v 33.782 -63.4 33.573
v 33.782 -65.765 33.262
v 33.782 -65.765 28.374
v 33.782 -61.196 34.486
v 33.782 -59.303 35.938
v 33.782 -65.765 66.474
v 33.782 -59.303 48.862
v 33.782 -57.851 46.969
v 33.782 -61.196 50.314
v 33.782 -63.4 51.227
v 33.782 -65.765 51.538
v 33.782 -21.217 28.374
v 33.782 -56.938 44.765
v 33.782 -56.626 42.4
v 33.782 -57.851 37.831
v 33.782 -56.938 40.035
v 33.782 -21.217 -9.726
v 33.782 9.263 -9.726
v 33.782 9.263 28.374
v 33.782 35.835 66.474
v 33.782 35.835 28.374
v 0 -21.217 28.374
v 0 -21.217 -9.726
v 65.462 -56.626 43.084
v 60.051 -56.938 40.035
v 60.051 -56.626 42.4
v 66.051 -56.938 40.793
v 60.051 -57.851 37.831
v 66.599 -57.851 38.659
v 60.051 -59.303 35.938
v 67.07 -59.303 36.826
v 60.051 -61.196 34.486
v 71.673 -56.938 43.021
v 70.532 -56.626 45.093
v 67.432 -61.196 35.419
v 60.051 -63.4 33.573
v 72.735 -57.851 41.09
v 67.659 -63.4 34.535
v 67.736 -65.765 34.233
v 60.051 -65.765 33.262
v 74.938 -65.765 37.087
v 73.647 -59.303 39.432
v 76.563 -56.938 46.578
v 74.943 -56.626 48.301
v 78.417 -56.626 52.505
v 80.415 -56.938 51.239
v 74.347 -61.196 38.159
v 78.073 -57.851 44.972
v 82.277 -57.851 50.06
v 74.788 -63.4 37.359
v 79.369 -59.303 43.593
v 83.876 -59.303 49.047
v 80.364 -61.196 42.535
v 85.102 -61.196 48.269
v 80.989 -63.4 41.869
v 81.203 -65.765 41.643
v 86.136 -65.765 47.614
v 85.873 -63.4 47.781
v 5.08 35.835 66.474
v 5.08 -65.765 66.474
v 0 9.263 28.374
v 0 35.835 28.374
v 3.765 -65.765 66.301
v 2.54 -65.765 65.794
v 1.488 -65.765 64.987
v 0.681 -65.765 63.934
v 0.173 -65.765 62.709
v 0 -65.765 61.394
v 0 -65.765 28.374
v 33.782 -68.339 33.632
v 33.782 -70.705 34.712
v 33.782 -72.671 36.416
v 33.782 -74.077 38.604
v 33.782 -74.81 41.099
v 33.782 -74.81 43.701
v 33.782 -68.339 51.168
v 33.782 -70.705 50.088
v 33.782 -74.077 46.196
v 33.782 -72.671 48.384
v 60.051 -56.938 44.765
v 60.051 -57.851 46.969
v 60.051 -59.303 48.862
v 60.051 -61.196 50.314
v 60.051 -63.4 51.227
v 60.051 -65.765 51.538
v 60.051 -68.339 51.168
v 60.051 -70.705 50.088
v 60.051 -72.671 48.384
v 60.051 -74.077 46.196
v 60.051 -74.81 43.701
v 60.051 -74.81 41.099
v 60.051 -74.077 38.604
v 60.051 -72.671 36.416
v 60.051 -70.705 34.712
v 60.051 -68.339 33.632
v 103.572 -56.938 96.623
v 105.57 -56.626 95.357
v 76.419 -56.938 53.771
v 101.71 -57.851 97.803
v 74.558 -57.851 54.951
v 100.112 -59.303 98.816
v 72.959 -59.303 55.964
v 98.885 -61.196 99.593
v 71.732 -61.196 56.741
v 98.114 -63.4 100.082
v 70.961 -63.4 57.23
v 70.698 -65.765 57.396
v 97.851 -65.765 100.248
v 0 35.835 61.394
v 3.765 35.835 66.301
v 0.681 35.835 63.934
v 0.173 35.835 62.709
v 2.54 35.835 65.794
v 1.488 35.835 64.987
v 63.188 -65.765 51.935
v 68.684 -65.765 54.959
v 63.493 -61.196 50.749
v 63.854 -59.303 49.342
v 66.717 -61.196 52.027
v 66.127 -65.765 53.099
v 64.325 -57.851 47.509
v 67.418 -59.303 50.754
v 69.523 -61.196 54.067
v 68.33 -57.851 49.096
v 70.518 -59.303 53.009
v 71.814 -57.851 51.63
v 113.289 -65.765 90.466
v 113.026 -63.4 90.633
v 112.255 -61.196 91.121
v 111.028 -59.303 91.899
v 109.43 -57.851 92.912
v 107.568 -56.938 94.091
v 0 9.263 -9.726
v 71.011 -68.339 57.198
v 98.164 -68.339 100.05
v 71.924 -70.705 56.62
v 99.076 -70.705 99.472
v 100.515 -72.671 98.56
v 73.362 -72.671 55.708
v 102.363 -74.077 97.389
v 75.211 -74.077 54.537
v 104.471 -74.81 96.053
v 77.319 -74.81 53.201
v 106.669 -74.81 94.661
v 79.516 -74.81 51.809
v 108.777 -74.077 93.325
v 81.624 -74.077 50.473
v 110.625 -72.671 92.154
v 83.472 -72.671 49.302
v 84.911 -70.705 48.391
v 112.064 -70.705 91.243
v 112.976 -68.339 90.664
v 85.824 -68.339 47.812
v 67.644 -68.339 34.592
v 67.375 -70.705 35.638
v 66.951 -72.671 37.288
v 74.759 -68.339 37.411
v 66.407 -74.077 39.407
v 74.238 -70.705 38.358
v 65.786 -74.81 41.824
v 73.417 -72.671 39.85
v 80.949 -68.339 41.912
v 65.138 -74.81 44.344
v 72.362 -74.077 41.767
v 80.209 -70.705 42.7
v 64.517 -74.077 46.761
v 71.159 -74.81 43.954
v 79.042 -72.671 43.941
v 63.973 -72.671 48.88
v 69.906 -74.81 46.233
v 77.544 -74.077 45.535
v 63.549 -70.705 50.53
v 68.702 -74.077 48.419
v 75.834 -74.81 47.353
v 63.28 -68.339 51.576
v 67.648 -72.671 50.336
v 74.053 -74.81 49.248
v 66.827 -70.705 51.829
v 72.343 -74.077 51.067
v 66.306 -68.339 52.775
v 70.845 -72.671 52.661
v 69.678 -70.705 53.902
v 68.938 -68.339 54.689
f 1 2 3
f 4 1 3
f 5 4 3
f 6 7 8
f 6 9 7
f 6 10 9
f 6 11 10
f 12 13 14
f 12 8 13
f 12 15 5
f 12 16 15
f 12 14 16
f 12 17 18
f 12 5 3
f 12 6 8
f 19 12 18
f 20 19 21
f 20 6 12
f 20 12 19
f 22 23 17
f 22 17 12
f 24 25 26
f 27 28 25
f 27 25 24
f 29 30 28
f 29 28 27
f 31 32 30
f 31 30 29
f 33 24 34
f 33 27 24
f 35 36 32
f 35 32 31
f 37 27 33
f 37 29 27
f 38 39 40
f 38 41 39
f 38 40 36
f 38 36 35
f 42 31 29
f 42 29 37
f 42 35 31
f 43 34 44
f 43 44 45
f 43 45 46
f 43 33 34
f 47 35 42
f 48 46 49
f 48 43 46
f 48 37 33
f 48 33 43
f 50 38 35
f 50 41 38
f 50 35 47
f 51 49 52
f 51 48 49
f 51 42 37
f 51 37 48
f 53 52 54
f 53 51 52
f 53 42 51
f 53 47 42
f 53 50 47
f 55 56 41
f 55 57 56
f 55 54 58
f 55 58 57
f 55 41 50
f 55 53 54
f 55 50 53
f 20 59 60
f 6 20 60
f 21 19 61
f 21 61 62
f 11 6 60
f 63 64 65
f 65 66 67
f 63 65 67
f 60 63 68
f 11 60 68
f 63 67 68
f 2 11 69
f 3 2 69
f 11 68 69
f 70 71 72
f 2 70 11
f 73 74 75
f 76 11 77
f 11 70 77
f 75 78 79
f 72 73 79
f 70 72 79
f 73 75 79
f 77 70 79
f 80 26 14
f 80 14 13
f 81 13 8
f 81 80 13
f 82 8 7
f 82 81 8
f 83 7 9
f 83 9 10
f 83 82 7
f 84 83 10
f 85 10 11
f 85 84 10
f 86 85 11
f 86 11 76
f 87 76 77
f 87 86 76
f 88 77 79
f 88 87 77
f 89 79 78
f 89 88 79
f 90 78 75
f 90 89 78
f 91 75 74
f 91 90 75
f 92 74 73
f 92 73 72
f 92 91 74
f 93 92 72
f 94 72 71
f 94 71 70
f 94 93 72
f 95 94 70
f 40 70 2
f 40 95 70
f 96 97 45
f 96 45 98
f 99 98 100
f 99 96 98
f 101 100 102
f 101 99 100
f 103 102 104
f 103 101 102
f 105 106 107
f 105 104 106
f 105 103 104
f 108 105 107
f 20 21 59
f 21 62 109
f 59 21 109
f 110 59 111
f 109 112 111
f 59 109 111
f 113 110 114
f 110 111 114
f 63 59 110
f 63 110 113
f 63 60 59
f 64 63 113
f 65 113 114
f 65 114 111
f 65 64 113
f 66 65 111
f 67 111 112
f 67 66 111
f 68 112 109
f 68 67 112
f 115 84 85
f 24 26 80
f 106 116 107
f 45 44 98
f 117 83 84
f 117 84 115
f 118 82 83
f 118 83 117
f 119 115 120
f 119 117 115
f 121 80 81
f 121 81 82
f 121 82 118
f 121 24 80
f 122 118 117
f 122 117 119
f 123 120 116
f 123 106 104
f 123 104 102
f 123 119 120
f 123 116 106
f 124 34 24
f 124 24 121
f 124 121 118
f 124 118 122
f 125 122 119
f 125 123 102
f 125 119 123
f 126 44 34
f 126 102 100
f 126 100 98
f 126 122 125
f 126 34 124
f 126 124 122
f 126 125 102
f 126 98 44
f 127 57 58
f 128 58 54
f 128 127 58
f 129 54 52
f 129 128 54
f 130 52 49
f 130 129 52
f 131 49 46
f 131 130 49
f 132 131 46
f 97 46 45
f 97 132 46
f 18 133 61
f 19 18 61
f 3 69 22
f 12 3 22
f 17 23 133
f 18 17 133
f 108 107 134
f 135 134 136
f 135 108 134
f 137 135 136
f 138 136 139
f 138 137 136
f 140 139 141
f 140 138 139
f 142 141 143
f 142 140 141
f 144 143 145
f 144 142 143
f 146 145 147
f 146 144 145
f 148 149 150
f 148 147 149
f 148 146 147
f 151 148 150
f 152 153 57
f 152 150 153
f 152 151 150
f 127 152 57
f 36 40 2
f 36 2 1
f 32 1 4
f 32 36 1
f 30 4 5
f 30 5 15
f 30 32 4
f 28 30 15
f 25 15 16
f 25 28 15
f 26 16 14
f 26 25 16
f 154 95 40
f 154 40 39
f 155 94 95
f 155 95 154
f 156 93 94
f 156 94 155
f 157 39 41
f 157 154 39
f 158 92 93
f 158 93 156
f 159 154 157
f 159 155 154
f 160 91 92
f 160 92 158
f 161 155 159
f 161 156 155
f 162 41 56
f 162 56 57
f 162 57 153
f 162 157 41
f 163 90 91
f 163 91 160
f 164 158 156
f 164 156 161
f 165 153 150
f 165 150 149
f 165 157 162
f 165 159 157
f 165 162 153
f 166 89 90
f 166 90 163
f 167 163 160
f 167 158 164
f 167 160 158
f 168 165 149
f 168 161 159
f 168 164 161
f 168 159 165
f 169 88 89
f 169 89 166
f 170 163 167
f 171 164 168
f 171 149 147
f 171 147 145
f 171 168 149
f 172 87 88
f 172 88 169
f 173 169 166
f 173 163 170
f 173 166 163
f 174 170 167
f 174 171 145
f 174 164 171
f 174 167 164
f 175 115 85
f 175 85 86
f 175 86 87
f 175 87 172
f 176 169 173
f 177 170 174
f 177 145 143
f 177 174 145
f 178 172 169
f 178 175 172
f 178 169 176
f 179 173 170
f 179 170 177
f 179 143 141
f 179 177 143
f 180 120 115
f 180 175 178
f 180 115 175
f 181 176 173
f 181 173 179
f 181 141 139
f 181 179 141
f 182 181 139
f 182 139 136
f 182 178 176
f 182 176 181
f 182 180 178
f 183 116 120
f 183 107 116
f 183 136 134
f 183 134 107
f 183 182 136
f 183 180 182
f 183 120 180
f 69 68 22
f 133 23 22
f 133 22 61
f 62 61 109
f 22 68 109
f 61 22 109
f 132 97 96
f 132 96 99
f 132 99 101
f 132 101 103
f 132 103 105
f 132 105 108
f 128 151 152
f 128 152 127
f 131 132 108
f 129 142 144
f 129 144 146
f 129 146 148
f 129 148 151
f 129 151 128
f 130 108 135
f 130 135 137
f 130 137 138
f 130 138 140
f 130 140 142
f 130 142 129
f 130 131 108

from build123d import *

# Parameters (mm, degrees)
F0_W     = 30.4800020866
F0_H     = 16.8474918601
F0_H_2   = 38.1
F1_DEPTH = 33.782
F2_R     = 5.08


with BuildPart() as f1:
    # F0 (on Right) → F1 (new body)
    with BuildSketch(Plane.YZ):
        Polygon((35.8352853537, 66.4744316269), (-65.7647146463, 66.4744316269), (-65.7647146463, 28.3744316269), (-21.2170266578, 28.3744316269), (-21.2170266578, 45.221923487), (9.2629754288, 45.221923487), (9.2629754288, 28.3744316269), (35.8352853537, 28.3744316269), align=None)
        with Locations((-5.9770256145, 36.798177557)):
            Rectangle(F0_W, F0_H)
        with Locations((-5.9770256145, 9.3244316269)):
            Rectangle(F0_W, F0_H_2)
    extrude(amount=F1_DEPTH)

    # F2
    f2_edges = [f1.edges().sort_by_distance(p)[0] for p in [
        (0, -14.964715, 66.474432),
    ]]
    fillet(f2_edges, radius=F2_R)

    # F5: sweep along a path in F4
    with BuildLine(Plane.XZ.offset(65.7647146463)) as f5_path:
        Line((33.782, 42.0884639025), (60.0511431694, 42.0884639025))
        ThreePointArc((60.0511431694, 42.0884639025), (70.6826462574, 44.8201545239), (78.680468738, 52.3385205118))
        Line((78.680468738, 52.3385205118), (105.8331268172, 95.1905814836))
    # F3 (on face) → F5 (sweep)
    with BuildSketch(Plane.YZ.offset(33.782)):
        with BuildLine():
            Line((-65.7647146463, 33.2616948167), (-65.7647146463, 51.53828034))
            ThreePointArc((-65.7647146463, 51.53828034), (-74.903007408, 42.3999875784), (-65.7647146463, 33.2616948167))
        make_face()
        with BuildLine():
            ThreePointArc((-65.7647146463, 33.2616948167), (-59.3029658661, 35.9382387982), (-56.6264218847, 42.3999875784))
            ThreePointArc((-56.6264218847, 42.3999875784), (-59.3029658661, 48.8617363586), (-65.7647146463, 51.53828034))
            Line((-65.7647146463, 51.53828034), (-65.7647146463, 33.2616948167))
        make_face()
    sweep(path=f5_path.line)


solid = f1.part
